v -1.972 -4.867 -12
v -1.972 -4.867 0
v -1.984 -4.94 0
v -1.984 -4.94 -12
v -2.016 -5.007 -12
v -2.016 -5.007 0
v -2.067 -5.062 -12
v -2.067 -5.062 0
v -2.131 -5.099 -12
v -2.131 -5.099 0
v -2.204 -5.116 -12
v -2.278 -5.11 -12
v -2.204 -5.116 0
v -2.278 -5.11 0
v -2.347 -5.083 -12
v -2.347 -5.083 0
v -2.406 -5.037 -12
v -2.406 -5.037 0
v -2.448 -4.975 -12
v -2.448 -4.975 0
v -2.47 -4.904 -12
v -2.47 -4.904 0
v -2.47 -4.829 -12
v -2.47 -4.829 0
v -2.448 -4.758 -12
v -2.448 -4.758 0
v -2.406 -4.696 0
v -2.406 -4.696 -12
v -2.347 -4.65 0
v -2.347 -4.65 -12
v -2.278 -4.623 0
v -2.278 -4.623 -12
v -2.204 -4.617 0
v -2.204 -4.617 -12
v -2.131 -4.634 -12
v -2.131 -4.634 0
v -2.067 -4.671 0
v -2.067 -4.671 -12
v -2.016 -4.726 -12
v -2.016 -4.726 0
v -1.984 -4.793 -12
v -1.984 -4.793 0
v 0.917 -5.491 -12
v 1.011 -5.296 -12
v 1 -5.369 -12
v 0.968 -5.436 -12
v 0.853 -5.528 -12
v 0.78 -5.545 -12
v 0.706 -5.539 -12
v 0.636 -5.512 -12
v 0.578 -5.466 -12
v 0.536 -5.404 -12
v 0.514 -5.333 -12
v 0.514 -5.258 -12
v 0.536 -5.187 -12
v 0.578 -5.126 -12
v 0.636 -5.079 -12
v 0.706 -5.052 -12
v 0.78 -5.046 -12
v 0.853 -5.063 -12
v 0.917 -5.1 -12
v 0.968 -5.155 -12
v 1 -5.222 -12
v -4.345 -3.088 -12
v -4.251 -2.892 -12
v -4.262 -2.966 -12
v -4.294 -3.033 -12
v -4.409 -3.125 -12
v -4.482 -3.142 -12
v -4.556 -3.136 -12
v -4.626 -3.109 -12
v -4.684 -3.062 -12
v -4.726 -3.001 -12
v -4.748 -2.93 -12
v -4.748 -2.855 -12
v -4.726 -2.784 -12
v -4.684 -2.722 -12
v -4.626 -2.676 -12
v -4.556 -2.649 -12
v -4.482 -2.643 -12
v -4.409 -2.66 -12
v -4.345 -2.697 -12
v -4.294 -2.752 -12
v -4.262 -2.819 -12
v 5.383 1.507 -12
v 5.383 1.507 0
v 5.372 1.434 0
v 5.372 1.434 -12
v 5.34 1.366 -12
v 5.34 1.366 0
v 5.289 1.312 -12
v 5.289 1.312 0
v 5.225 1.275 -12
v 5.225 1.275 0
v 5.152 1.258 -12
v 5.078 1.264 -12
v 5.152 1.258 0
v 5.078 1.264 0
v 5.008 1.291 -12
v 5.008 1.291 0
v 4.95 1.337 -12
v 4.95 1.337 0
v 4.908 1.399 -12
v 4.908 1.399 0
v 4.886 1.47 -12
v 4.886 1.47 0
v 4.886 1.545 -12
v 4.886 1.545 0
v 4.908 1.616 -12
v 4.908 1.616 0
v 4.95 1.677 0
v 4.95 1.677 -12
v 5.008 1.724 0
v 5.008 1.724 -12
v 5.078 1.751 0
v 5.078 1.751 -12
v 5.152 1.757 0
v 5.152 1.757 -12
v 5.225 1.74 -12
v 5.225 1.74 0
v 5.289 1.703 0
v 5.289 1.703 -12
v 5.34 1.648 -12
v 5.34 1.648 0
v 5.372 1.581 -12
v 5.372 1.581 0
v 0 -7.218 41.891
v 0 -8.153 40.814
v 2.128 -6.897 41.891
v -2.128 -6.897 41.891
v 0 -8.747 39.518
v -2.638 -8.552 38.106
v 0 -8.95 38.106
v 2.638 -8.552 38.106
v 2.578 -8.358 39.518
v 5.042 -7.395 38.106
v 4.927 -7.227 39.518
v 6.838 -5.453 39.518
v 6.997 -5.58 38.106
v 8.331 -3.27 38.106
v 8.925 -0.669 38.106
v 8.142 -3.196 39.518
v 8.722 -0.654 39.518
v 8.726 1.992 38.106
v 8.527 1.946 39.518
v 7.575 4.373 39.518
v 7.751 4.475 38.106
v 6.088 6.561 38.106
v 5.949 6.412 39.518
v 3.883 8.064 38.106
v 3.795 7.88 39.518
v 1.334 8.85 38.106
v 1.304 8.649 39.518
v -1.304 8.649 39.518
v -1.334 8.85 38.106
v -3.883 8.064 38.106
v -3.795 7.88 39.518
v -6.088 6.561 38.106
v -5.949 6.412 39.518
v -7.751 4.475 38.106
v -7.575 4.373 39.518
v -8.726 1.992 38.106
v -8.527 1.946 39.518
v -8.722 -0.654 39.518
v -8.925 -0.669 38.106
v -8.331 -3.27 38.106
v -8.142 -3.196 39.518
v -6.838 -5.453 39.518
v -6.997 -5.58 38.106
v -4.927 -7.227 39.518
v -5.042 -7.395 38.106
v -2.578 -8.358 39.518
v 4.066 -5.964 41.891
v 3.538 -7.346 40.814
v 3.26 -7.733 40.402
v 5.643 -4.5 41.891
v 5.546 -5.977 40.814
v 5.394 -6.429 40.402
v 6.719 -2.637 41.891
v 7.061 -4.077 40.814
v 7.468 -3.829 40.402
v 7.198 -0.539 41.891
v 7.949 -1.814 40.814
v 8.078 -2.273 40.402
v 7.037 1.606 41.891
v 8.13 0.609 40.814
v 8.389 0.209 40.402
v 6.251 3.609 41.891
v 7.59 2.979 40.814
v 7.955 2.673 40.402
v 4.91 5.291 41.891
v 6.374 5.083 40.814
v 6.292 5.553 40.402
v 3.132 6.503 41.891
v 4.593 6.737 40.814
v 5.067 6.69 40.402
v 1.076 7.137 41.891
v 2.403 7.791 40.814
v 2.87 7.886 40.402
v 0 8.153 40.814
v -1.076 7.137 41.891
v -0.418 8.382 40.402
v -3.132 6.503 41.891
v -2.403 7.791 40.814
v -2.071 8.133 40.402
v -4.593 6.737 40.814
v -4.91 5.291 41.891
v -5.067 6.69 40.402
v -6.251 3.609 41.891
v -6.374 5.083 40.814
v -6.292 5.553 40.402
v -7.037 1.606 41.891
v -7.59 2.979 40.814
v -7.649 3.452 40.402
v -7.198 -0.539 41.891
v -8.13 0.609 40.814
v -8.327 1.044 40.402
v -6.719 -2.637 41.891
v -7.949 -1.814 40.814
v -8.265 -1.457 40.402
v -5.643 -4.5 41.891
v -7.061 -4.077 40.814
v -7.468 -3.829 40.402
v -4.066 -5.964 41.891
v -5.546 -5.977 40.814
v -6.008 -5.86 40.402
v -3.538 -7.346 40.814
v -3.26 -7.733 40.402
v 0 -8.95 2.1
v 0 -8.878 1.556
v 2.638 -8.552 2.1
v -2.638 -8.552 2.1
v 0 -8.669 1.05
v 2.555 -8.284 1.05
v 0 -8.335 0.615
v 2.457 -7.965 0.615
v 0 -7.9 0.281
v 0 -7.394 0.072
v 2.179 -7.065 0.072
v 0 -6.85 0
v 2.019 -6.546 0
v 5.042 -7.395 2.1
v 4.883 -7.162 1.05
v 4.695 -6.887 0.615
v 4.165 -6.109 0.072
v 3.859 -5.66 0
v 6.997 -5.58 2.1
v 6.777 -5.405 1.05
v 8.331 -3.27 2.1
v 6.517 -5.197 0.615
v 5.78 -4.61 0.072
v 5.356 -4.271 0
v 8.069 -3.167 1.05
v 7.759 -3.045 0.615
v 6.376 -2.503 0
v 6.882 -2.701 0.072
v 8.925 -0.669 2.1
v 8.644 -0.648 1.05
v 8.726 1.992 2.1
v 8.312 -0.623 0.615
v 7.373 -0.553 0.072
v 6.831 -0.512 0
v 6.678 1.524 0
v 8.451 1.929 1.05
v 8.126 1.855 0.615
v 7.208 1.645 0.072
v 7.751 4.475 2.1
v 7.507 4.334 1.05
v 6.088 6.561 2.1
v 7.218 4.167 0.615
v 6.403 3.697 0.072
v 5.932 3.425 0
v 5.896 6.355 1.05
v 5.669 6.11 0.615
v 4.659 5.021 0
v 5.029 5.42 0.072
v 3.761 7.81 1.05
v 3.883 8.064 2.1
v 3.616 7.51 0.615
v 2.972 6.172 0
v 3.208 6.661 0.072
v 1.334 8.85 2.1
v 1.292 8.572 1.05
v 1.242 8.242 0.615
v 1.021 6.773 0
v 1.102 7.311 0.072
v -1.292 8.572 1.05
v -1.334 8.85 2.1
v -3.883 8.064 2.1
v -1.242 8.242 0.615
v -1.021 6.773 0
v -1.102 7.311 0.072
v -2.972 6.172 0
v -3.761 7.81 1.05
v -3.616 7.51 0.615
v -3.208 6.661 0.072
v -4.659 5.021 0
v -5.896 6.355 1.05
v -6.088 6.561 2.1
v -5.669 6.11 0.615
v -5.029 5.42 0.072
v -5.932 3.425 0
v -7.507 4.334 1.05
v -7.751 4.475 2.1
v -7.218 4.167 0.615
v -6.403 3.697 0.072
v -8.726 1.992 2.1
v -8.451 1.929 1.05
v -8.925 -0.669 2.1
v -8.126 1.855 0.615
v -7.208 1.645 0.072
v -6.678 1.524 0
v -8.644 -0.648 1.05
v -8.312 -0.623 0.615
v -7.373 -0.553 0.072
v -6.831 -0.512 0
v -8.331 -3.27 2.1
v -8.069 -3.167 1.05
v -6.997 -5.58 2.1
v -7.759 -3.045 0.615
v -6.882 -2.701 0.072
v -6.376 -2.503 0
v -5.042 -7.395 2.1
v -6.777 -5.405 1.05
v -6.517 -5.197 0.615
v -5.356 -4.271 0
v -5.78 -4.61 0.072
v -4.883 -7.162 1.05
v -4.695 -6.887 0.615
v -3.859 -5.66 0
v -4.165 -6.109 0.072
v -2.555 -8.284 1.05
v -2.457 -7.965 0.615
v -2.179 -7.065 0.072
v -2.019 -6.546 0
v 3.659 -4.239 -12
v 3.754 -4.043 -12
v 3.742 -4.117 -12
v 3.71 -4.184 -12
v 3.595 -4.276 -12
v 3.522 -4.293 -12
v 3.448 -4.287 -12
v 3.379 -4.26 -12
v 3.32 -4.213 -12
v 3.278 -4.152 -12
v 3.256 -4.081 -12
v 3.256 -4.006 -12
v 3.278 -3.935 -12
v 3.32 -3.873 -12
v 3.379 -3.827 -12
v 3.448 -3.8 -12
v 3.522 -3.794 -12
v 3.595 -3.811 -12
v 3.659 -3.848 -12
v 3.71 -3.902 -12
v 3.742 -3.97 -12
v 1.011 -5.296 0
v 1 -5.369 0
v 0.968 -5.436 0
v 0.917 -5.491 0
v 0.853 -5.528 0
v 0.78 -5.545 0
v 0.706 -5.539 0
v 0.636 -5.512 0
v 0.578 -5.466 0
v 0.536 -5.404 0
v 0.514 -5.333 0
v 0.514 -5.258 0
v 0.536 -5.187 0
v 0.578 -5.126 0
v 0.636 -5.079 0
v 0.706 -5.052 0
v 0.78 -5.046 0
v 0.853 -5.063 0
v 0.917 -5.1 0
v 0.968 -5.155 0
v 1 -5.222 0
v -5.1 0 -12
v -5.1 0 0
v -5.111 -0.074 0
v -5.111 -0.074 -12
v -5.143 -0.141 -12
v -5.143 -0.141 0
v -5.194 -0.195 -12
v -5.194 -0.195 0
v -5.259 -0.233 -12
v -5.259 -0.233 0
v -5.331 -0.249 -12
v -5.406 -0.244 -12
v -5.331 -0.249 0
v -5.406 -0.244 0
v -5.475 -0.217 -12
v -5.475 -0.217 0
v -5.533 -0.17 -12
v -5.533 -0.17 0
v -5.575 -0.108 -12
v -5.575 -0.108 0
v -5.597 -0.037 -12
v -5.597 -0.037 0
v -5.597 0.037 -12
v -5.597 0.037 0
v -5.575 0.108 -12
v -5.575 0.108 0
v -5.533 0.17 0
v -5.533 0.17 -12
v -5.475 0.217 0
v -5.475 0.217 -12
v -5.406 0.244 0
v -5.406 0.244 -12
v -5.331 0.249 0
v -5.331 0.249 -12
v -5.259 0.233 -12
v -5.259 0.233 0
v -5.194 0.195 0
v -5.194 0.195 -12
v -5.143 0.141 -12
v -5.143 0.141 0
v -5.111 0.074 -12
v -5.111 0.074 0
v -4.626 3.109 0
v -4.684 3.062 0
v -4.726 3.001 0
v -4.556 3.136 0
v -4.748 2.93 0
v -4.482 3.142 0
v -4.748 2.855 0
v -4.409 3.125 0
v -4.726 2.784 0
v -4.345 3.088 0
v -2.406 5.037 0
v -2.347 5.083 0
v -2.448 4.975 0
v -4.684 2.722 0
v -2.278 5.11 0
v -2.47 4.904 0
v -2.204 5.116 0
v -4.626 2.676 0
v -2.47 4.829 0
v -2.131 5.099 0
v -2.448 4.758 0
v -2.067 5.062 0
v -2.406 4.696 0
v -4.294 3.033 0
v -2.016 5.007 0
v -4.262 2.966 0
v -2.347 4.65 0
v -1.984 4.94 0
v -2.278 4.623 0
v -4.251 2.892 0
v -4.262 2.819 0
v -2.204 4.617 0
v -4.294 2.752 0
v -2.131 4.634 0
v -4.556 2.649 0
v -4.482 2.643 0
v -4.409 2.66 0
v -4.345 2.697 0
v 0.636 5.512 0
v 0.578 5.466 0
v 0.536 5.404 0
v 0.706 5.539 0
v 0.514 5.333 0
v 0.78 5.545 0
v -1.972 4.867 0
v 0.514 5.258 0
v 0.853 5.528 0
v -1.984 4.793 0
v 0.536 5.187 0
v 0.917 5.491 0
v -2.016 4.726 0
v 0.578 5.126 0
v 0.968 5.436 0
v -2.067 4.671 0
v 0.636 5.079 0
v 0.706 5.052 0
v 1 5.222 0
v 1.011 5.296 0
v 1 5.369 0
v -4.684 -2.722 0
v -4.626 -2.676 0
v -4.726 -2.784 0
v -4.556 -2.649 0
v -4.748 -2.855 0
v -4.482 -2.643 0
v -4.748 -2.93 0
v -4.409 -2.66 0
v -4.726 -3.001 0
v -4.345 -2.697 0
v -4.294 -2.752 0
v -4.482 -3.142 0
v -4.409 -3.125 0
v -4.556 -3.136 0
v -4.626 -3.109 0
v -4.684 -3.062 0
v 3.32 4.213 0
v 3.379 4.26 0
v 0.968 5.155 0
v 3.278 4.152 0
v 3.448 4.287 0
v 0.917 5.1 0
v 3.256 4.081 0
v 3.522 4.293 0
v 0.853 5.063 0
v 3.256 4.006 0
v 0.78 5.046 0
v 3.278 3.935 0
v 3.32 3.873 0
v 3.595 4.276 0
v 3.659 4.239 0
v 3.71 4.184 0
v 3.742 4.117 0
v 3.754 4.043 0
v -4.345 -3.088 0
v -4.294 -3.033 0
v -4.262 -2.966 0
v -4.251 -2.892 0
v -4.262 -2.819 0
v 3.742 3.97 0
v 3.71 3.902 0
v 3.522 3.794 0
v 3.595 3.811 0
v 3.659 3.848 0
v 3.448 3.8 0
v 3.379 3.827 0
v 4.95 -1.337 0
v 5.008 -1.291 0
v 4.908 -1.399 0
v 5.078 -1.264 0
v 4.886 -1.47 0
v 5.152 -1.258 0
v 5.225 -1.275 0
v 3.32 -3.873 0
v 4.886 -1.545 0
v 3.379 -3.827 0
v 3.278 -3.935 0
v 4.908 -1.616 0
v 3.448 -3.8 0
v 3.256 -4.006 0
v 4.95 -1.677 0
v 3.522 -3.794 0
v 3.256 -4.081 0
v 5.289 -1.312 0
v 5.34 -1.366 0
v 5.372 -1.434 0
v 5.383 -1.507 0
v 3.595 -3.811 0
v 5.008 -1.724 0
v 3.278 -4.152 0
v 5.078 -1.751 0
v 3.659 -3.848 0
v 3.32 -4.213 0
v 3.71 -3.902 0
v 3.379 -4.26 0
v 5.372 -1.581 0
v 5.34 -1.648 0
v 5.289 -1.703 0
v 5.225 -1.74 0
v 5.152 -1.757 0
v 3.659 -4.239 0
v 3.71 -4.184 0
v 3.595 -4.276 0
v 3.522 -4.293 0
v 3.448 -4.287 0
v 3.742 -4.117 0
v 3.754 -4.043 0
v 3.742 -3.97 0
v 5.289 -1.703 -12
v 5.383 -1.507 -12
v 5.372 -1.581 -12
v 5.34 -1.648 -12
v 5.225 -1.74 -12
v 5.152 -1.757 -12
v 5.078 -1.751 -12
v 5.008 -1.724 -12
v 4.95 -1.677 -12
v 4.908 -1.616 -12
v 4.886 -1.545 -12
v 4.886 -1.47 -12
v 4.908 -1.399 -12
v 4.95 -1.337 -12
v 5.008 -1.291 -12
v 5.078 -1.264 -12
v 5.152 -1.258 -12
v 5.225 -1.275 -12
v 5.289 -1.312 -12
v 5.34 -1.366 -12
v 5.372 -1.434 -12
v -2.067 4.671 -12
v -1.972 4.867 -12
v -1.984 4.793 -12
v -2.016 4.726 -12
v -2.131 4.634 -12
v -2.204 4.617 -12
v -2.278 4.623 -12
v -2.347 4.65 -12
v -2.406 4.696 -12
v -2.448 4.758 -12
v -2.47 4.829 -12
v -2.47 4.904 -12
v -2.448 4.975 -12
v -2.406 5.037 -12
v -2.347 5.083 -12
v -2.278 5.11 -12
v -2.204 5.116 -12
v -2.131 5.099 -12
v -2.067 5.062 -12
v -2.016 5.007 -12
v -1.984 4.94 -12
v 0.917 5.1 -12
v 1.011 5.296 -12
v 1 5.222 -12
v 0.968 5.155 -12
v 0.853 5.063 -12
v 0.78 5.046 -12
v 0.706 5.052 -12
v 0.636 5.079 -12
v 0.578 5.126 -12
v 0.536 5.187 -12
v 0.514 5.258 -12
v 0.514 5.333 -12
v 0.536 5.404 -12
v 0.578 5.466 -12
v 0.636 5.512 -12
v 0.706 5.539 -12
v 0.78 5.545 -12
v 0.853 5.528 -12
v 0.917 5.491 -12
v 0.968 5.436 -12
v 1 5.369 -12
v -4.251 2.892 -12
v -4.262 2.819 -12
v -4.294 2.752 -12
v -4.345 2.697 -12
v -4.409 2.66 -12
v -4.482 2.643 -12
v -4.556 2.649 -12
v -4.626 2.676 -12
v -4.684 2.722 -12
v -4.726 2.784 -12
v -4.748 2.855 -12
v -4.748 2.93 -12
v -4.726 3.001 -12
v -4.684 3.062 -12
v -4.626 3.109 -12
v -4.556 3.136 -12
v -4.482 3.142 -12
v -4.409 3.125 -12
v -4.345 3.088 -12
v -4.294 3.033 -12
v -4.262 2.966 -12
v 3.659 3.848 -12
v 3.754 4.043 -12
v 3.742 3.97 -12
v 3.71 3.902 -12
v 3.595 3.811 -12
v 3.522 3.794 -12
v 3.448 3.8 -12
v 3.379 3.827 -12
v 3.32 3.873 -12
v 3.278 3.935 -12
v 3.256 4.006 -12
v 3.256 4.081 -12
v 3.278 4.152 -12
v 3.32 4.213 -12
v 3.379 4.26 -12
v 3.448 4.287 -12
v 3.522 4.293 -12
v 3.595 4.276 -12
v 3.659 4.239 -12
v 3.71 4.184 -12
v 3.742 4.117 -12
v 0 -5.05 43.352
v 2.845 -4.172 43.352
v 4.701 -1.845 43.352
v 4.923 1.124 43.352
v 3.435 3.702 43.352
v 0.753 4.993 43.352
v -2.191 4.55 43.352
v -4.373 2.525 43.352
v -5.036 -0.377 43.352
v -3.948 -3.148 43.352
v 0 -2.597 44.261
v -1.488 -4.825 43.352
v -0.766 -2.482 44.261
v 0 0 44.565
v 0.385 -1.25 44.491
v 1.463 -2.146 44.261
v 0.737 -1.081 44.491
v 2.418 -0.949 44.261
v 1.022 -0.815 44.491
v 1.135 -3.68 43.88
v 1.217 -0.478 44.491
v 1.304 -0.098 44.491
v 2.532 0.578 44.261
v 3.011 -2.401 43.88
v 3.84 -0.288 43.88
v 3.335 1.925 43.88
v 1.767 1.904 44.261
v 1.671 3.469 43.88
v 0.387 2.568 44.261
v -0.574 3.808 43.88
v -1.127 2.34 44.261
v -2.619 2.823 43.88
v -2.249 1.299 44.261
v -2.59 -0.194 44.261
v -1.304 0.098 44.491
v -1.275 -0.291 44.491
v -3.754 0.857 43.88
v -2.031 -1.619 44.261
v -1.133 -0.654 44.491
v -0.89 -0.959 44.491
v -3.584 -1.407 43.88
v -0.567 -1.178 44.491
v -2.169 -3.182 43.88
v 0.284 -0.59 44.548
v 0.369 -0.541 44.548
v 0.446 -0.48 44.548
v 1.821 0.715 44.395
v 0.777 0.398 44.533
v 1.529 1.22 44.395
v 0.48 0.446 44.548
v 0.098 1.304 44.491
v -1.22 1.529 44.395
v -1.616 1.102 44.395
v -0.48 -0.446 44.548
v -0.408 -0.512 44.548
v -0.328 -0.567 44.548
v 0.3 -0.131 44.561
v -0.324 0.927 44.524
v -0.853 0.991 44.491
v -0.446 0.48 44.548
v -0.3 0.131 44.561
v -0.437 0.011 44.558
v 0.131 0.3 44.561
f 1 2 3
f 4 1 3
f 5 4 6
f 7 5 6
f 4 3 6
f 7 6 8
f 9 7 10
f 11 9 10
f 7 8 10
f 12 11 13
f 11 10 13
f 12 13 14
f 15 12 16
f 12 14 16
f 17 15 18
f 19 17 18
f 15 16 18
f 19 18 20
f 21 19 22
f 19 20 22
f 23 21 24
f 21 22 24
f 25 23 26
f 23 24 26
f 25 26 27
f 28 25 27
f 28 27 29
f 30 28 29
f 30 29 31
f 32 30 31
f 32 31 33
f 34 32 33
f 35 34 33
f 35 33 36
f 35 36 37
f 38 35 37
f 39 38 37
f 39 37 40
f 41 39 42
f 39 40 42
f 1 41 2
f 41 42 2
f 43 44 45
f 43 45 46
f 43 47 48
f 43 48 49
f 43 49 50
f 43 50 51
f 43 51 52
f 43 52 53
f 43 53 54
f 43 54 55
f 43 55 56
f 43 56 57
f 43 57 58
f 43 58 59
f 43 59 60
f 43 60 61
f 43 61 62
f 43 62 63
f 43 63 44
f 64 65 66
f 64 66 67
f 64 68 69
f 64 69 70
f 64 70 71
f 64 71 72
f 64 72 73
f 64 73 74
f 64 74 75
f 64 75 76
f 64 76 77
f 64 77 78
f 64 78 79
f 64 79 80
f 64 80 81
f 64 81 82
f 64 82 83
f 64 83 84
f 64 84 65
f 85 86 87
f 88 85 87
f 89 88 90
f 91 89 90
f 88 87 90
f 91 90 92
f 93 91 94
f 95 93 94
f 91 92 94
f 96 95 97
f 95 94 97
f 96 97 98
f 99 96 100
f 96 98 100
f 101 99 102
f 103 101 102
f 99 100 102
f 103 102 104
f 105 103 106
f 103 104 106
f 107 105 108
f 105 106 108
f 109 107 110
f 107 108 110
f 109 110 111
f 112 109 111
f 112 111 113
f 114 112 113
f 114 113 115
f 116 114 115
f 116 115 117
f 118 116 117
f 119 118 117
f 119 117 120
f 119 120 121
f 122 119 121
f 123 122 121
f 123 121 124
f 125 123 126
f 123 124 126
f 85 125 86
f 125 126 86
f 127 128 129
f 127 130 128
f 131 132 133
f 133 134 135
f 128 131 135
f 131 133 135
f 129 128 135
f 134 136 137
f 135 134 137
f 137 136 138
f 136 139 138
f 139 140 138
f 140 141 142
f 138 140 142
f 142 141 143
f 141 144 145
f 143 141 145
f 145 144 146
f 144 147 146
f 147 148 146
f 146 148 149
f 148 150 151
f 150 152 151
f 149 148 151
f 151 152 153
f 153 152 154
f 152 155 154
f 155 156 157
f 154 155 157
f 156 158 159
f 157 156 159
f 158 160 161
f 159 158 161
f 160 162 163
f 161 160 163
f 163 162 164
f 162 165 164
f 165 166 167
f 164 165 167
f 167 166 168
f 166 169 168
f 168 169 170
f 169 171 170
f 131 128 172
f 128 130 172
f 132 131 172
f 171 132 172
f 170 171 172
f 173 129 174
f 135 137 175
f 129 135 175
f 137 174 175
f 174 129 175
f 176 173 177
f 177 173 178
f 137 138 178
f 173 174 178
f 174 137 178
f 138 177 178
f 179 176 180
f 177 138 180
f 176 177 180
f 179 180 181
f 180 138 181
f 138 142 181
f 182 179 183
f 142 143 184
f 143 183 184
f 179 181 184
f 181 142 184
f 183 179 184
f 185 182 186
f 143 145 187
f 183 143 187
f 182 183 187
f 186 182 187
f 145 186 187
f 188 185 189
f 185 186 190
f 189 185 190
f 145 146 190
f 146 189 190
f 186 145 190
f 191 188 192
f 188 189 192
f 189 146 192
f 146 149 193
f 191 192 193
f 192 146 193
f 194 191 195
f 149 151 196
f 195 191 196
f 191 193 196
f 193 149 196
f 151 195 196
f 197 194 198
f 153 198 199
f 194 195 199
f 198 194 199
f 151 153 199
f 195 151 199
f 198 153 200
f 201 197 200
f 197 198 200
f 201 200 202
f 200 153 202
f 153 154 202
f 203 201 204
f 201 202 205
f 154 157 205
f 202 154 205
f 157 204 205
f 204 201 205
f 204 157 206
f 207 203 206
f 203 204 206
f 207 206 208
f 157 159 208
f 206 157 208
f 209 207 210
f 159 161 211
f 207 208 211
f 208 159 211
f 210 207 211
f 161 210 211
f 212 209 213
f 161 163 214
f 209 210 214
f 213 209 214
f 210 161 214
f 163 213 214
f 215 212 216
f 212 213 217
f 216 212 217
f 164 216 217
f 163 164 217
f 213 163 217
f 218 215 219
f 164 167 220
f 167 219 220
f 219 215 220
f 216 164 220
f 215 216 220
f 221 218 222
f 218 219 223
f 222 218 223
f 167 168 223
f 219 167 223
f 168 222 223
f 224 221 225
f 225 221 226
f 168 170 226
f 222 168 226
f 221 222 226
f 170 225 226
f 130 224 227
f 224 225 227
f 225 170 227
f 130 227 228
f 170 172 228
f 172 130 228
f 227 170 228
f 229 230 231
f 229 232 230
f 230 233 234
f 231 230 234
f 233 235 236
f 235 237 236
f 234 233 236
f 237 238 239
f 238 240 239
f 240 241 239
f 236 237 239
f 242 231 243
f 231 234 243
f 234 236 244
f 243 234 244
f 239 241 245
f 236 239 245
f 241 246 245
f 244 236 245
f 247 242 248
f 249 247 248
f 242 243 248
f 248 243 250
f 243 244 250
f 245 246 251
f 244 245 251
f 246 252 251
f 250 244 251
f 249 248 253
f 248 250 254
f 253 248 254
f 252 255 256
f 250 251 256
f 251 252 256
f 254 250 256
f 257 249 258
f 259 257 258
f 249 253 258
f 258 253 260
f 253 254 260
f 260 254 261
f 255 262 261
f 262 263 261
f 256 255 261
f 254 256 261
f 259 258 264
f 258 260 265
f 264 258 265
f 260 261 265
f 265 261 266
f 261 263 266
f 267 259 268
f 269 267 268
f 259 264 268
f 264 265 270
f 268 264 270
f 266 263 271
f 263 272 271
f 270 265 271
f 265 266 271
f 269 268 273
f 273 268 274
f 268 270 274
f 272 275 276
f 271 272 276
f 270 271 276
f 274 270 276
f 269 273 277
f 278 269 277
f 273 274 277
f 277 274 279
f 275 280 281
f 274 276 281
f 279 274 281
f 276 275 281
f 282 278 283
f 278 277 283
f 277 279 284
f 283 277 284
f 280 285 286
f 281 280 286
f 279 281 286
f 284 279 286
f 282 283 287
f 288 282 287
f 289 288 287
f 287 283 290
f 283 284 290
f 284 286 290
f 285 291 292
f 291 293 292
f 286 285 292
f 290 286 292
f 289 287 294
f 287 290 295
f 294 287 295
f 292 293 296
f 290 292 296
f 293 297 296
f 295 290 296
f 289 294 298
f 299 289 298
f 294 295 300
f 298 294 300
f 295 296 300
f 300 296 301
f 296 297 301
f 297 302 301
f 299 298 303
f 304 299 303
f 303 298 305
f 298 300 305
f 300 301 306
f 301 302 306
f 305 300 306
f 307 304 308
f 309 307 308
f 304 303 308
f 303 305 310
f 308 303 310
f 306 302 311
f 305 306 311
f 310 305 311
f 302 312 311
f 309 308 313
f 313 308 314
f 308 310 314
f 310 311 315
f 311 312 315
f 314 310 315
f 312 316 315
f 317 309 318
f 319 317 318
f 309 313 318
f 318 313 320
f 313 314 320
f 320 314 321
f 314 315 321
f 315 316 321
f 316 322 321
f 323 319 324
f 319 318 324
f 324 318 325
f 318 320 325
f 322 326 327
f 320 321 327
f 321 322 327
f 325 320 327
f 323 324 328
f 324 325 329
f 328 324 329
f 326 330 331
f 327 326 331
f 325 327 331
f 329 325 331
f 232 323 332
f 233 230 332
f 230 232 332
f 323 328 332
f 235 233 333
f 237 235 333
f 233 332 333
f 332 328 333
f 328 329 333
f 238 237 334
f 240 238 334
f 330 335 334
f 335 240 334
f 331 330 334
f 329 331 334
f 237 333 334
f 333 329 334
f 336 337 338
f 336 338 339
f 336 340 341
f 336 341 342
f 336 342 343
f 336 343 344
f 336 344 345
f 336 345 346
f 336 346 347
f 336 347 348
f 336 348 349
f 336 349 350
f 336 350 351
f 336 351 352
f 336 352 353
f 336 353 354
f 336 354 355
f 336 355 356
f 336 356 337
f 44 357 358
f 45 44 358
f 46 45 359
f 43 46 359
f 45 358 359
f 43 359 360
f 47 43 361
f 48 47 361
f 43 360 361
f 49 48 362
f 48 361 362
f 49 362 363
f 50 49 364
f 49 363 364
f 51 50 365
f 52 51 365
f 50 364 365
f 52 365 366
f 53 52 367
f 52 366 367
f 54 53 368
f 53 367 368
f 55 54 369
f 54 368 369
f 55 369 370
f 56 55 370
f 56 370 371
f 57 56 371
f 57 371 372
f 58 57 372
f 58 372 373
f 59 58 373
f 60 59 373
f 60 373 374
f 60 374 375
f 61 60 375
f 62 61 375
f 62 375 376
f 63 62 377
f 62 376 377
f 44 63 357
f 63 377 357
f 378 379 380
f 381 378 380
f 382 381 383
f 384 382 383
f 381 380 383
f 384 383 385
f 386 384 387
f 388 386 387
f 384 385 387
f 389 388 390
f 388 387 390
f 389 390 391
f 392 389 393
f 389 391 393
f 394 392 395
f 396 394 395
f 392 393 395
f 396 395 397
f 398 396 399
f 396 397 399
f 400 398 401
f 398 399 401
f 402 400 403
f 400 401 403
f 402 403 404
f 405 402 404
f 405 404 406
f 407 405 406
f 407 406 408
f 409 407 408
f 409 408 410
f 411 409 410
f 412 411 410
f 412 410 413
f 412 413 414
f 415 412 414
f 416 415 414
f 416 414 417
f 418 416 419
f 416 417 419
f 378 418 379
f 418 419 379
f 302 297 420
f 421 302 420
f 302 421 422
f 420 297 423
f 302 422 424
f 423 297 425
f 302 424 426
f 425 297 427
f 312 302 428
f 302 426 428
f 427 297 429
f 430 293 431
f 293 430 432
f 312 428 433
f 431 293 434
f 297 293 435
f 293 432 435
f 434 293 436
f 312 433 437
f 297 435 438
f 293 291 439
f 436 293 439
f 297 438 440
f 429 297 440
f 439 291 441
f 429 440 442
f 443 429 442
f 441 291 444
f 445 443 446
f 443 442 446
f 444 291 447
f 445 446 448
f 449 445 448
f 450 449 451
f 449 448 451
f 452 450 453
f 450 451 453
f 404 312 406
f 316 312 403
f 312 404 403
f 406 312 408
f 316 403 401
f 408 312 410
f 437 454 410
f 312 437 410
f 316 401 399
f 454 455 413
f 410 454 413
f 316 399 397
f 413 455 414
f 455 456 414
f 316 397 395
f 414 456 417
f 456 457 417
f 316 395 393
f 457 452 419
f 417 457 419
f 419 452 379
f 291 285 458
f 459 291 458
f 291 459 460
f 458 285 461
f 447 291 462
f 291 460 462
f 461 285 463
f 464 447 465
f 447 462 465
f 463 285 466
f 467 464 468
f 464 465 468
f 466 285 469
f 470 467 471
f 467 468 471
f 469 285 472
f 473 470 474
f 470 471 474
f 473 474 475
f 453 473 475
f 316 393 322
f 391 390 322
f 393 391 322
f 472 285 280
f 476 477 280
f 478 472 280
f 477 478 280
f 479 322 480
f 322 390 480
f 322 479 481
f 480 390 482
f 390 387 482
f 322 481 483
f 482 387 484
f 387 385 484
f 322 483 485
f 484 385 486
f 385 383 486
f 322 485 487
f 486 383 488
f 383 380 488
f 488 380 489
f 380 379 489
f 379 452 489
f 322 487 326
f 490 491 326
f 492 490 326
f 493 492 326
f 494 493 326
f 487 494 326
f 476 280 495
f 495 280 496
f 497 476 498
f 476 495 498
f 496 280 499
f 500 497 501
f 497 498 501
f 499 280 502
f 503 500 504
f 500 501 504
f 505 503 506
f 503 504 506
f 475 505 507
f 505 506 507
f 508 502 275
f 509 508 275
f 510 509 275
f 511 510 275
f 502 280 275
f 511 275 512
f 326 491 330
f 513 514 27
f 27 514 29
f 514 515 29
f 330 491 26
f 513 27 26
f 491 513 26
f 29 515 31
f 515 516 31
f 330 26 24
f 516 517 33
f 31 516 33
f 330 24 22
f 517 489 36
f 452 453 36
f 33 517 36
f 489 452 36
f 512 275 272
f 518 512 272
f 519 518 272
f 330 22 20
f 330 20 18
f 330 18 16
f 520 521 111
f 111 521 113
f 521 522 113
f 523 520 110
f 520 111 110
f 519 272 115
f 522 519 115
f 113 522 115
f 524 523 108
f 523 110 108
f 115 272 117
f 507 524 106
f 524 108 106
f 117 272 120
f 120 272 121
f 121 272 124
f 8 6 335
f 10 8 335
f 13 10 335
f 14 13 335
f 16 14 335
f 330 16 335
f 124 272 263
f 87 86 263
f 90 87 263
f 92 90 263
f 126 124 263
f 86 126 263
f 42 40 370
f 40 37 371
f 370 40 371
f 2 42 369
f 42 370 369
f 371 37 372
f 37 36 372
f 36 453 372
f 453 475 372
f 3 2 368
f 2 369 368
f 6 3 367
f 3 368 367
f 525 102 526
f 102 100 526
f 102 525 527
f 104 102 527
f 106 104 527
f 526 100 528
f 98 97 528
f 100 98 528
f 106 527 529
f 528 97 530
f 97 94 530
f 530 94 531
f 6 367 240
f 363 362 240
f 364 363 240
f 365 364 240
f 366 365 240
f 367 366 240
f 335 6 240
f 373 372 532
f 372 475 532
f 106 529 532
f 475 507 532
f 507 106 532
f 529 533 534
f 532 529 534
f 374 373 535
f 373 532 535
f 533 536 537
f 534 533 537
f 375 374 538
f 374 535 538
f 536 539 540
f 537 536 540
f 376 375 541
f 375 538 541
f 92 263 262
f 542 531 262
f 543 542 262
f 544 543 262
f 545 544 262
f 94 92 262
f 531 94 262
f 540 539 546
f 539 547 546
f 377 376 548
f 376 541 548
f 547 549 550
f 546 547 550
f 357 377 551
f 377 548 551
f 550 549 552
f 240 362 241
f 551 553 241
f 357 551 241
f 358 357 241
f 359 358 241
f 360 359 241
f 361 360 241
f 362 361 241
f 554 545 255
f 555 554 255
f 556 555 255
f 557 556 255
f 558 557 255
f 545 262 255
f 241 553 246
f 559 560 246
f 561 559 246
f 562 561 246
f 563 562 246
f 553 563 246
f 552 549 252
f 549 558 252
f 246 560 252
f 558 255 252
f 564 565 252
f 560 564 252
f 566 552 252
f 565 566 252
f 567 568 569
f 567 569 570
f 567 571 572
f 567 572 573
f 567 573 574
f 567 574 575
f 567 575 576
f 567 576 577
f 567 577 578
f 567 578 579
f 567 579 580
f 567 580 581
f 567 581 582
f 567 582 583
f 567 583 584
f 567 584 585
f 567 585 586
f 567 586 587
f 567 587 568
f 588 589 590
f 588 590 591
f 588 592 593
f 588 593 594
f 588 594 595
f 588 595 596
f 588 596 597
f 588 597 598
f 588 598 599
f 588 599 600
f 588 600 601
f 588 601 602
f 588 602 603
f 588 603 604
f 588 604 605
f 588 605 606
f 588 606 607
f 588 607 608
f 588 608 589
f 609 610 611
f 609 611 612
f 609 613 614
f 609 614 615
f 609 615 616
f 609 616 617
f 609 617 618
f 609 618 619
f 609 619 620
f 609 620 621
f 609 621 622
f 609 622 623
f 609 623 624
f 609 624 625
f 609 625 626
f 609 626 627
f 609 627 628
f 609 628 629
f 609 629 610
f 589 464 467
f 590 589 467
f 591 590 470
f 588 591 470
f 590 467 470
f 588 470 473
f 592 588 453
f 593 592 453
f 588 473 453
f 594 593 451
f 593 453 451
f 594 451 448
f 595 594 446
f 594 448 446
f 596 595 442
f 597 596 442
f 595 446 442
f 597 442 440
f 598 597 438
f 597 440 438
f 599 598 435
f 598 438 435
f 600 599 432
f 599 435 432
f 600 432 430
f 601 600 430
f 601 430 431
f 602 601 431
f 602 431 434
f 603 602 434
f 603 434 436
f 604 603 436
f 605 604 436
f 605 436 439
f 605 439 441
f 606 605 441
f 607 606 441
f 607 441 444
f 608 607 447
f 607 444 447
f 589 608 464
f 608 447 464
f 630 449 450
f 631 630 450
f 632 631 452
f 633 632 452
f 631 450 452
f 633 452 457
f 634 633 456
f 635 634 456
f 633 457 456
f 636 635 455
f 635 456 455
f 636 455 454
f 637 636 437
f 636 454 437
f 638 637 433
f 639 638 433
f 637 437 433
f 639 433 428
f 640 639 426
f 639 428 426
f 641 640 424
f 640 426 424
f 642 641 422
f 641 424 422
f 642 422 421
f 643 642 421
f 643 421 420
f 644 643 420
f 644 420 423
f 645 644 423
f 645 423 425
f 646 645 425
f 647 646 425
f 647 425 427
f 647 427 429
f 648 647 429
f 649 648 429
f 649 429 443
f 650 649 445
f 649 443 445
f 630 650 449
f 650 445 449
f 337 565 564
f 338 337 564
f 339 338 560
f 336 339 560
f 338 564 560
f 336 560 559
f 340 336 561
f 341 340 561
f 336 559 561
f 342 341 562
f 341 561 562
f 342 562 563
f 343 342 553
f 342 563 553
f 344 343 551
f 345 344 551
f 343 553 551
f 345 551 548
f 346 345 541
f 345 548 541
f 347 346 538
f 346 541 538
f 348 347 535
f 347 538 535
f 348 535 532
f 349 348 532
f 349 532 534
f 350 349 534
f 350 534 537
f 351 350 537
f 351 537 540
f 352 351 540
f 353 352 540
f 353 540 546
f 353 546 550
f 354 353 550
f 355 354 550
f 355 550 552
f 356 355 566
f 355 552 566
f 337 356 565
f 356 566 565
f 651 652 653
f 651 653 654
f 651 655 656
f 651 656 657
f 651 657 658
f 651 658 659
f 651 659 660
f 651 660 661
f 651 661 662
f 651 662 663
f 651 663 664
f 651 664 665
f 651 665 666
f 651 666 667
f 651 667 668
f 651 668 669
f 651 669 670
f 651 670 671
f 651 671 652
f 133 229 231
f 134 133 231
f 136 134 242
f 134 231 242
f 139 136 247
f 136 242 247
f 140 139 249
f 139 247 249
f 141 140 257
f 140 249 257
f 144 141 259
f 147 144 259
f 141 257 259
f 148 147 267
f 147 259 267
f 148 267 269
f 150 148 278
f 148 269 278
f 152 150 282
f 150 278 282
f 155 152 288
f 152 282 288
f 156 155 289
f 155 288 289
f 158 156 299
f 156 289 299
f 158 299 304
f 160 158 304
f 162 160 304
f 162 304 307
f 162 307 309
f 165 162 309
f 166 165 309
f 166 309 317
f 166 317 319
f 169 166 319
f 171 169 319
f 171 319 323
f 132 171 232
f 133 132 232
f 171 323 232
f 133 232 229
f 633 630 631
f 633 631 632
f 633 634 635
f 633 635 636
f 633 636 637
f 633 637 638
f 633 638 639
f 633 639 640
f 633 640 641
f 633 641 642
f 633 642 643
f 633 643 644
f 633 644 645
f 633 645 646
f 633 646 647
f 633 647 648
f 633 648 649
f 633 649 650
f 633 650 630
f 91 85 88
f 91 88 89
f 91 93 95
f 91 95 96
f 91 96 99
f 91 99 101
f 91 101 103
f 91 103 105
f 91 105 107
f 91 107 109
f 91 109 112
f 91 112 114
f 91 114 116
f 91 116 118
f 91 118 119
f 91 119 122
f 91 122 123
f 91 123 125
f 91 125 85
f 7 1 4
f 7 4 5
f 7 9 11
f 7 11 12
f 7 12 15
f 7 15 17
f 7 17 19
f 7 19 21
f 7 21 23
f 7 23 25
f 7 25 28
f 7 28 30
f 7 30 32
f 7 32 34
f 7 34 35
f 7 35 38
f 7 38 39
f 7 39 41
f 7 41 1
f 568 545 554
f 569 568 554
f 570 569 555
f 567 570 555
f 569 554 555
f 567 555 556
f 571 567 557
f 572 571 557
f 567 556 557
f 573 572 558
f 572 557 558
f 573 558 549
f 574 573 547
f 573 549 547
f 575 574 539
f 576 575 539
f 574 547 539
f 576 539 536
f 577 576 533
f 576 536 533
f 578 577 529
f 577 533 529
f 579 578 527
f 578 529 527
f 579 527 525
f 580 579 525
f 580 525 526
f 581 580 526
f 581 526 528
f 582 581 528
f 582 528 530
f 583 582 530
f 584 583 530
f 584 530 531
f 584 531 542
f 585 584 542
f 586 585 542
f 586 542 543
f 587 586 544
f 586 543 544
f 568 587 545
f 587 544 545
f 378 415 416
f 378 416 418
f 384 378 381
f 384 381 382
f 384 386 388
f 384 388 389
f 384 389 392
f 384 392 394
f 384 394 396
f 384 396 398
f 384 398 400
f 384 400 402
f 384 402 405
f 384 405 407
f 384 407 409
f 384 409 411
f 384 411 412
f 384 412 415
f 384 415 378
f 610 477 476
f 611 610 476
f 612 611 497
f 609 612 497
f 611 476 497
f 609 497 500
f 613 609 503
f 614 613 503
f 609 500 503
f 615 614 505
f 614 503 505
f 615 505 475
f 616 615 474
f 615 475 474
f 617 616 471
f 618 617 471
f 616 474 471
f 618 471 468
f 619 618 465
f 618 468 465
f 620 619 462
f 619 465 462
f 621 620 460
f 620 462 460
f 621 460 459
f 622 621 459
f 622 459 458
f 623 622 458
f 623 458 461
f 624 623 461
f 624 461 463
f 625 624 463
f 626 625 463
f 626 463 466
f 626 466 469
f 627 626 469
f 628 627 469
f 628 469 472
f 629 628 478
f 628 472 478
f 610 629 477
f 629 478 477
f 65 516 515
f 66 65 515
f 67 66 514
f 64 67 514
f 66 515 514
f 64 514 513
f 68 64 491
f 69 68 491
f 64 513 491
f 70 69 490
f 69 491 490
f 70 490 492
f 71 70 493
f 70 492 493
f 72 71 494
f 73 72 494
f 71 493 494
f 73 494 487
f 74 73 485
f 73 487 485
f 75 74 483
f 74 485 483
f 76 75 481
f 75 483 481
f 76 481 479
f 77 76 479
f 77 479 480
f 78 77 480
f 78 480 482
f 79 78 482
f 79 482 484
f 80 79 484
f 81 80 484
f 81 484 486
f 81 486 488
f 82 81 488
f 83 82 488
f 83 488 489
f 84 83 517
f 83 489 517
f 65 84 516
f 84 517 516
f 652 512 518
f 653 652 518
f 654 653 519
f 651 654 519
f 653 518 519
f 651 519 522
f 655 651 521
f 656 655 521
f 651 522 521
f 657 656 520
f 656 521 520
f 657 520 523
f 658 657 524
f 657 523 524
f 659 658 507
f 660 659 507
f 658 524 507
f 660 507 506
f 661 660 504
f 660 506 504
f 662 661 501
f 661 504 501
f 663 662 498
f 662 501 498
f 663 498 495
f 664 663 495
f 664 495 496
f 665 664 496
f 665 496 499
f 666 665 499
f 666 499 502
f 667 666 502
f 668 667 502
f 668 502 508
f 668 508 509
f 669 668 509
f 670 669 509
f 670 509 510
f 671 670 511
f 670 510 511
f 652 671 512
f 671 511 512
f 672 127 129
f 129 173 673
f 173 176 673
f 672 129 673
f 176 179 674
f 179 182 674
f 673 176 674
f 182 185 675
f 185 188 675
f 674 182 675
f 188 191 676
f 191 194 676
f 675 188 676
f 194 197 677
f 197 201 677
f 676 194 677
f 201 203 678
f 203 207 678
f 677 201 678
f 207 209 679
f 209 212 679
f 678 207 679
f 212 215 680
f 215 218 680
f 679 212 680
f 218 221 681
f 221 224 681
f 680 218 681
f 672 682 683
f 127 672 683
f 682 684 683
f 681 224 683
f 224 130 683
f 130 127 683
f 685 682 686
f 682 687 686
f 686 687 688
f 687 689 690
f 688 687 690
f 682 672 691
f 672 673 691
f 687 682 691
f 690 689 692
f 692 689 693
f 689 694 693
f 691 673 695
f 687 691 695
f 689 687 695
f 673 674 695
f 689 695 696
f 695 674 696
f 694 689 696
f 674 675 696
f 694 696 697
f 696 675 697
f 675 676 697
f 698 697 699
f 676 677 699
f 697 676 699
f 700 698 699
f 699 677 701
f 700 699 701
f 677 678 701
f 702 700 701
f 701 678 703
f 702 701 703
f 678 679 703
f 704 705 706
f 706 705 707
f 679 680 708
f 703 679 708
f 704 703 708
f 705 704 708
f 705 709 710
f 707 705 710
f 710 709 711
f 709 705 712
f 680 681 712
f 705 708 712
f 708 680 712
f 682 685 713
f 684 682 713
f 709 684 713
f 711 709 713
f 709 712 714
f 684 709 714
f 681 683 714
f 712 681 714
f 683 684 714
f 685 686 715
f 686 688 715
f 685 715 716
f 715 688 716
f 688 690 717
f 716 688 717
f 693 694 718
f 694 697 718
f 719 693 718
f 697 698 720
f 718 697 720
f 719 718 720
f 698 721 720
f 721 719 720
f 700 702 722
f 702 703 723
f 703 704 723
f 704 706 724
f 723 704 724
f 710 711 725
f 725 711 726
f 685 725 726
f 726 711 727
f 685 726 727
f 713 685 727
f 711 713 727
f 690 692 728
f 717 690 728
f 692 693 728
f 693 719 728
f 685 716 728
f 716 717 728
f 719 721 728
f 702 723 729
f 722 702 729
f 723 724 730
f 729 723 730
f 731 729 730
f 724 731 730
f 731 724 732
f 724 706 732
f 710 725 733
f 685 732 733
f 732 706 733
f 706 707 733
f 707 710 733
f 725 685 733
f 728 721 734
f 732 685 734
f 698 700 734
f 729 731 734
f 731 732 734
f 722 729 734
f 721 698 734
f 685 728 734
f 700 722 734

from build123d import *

# Parameters (mm, degrees)
F2_R     = 2.1
F3_R     = 0.25
F4_DEPTH = 12


with BuildPart() as f1:
    # F0 (on Right) → F1 (revolve)
    with BuildSketch(Plane.YZ):
        with BuildLine():
            Line((-8.95, 38.106404), (-8.95, 0))
            Line((-8.95, 0), (0, 0))
            Line((0, 0), (0, 44.565391))
            ThreePointArc((0, 44.565391), (-3.850647, 43.879973), (-7.218062, 41.890551))
            ThreePointArc((-7.218062, 41.890551), (-8.496444, 40.187232), (-8.95, 38.106404))
        make_face()
    revolve(axis=Axis((0, 0, 22.282695), (0, 0, 1)))

    # F2
    f2_edges = [f1.edges().sort_by_distance(p)[0] for p in [
        (0, 8.95, 0),
    ]]
    fillet(f2_edges, radius=F2_R)

    # F3 (on face) → F4 (join)
    with BuildSketch(Plane(origin=(0, 0, 0), x_dir=(1, 0, 0), z_dir=(0, 0, -1))):
        with Locations((-5.35, 0)):
            Circle(F3_R)
        with Locations((-4.500706, -2.892428)):
            Circle(F3_R)
        with Locations((-2.22247, -4.866531)):
            Circle(F3_R)
        with Locations((0.761384, -5.295545)):
            Circle(F3_R)
        with Locations((3.503505, -4.04326)):
            Circle(F3_R)
        with Locations((5.133287, -1.507269)):
            Circle(F3_R)
        with Locations((5.133287, 1.507269)):
            Circle(F3_R)
        with Locations((3.503505, 4.04326)):
            Circle(F3_R)
        with Locations((0.761384, 5.295545)):
            Circle(F3_R)
        with Locations((-2.22247, 4.866531)):
            Circle(F3_R)
        with Locations((-4.500706, 2.892428)):
            Circle(F3_R)
    extrude(amount=F4_DEPTH)


solid = f1.part
